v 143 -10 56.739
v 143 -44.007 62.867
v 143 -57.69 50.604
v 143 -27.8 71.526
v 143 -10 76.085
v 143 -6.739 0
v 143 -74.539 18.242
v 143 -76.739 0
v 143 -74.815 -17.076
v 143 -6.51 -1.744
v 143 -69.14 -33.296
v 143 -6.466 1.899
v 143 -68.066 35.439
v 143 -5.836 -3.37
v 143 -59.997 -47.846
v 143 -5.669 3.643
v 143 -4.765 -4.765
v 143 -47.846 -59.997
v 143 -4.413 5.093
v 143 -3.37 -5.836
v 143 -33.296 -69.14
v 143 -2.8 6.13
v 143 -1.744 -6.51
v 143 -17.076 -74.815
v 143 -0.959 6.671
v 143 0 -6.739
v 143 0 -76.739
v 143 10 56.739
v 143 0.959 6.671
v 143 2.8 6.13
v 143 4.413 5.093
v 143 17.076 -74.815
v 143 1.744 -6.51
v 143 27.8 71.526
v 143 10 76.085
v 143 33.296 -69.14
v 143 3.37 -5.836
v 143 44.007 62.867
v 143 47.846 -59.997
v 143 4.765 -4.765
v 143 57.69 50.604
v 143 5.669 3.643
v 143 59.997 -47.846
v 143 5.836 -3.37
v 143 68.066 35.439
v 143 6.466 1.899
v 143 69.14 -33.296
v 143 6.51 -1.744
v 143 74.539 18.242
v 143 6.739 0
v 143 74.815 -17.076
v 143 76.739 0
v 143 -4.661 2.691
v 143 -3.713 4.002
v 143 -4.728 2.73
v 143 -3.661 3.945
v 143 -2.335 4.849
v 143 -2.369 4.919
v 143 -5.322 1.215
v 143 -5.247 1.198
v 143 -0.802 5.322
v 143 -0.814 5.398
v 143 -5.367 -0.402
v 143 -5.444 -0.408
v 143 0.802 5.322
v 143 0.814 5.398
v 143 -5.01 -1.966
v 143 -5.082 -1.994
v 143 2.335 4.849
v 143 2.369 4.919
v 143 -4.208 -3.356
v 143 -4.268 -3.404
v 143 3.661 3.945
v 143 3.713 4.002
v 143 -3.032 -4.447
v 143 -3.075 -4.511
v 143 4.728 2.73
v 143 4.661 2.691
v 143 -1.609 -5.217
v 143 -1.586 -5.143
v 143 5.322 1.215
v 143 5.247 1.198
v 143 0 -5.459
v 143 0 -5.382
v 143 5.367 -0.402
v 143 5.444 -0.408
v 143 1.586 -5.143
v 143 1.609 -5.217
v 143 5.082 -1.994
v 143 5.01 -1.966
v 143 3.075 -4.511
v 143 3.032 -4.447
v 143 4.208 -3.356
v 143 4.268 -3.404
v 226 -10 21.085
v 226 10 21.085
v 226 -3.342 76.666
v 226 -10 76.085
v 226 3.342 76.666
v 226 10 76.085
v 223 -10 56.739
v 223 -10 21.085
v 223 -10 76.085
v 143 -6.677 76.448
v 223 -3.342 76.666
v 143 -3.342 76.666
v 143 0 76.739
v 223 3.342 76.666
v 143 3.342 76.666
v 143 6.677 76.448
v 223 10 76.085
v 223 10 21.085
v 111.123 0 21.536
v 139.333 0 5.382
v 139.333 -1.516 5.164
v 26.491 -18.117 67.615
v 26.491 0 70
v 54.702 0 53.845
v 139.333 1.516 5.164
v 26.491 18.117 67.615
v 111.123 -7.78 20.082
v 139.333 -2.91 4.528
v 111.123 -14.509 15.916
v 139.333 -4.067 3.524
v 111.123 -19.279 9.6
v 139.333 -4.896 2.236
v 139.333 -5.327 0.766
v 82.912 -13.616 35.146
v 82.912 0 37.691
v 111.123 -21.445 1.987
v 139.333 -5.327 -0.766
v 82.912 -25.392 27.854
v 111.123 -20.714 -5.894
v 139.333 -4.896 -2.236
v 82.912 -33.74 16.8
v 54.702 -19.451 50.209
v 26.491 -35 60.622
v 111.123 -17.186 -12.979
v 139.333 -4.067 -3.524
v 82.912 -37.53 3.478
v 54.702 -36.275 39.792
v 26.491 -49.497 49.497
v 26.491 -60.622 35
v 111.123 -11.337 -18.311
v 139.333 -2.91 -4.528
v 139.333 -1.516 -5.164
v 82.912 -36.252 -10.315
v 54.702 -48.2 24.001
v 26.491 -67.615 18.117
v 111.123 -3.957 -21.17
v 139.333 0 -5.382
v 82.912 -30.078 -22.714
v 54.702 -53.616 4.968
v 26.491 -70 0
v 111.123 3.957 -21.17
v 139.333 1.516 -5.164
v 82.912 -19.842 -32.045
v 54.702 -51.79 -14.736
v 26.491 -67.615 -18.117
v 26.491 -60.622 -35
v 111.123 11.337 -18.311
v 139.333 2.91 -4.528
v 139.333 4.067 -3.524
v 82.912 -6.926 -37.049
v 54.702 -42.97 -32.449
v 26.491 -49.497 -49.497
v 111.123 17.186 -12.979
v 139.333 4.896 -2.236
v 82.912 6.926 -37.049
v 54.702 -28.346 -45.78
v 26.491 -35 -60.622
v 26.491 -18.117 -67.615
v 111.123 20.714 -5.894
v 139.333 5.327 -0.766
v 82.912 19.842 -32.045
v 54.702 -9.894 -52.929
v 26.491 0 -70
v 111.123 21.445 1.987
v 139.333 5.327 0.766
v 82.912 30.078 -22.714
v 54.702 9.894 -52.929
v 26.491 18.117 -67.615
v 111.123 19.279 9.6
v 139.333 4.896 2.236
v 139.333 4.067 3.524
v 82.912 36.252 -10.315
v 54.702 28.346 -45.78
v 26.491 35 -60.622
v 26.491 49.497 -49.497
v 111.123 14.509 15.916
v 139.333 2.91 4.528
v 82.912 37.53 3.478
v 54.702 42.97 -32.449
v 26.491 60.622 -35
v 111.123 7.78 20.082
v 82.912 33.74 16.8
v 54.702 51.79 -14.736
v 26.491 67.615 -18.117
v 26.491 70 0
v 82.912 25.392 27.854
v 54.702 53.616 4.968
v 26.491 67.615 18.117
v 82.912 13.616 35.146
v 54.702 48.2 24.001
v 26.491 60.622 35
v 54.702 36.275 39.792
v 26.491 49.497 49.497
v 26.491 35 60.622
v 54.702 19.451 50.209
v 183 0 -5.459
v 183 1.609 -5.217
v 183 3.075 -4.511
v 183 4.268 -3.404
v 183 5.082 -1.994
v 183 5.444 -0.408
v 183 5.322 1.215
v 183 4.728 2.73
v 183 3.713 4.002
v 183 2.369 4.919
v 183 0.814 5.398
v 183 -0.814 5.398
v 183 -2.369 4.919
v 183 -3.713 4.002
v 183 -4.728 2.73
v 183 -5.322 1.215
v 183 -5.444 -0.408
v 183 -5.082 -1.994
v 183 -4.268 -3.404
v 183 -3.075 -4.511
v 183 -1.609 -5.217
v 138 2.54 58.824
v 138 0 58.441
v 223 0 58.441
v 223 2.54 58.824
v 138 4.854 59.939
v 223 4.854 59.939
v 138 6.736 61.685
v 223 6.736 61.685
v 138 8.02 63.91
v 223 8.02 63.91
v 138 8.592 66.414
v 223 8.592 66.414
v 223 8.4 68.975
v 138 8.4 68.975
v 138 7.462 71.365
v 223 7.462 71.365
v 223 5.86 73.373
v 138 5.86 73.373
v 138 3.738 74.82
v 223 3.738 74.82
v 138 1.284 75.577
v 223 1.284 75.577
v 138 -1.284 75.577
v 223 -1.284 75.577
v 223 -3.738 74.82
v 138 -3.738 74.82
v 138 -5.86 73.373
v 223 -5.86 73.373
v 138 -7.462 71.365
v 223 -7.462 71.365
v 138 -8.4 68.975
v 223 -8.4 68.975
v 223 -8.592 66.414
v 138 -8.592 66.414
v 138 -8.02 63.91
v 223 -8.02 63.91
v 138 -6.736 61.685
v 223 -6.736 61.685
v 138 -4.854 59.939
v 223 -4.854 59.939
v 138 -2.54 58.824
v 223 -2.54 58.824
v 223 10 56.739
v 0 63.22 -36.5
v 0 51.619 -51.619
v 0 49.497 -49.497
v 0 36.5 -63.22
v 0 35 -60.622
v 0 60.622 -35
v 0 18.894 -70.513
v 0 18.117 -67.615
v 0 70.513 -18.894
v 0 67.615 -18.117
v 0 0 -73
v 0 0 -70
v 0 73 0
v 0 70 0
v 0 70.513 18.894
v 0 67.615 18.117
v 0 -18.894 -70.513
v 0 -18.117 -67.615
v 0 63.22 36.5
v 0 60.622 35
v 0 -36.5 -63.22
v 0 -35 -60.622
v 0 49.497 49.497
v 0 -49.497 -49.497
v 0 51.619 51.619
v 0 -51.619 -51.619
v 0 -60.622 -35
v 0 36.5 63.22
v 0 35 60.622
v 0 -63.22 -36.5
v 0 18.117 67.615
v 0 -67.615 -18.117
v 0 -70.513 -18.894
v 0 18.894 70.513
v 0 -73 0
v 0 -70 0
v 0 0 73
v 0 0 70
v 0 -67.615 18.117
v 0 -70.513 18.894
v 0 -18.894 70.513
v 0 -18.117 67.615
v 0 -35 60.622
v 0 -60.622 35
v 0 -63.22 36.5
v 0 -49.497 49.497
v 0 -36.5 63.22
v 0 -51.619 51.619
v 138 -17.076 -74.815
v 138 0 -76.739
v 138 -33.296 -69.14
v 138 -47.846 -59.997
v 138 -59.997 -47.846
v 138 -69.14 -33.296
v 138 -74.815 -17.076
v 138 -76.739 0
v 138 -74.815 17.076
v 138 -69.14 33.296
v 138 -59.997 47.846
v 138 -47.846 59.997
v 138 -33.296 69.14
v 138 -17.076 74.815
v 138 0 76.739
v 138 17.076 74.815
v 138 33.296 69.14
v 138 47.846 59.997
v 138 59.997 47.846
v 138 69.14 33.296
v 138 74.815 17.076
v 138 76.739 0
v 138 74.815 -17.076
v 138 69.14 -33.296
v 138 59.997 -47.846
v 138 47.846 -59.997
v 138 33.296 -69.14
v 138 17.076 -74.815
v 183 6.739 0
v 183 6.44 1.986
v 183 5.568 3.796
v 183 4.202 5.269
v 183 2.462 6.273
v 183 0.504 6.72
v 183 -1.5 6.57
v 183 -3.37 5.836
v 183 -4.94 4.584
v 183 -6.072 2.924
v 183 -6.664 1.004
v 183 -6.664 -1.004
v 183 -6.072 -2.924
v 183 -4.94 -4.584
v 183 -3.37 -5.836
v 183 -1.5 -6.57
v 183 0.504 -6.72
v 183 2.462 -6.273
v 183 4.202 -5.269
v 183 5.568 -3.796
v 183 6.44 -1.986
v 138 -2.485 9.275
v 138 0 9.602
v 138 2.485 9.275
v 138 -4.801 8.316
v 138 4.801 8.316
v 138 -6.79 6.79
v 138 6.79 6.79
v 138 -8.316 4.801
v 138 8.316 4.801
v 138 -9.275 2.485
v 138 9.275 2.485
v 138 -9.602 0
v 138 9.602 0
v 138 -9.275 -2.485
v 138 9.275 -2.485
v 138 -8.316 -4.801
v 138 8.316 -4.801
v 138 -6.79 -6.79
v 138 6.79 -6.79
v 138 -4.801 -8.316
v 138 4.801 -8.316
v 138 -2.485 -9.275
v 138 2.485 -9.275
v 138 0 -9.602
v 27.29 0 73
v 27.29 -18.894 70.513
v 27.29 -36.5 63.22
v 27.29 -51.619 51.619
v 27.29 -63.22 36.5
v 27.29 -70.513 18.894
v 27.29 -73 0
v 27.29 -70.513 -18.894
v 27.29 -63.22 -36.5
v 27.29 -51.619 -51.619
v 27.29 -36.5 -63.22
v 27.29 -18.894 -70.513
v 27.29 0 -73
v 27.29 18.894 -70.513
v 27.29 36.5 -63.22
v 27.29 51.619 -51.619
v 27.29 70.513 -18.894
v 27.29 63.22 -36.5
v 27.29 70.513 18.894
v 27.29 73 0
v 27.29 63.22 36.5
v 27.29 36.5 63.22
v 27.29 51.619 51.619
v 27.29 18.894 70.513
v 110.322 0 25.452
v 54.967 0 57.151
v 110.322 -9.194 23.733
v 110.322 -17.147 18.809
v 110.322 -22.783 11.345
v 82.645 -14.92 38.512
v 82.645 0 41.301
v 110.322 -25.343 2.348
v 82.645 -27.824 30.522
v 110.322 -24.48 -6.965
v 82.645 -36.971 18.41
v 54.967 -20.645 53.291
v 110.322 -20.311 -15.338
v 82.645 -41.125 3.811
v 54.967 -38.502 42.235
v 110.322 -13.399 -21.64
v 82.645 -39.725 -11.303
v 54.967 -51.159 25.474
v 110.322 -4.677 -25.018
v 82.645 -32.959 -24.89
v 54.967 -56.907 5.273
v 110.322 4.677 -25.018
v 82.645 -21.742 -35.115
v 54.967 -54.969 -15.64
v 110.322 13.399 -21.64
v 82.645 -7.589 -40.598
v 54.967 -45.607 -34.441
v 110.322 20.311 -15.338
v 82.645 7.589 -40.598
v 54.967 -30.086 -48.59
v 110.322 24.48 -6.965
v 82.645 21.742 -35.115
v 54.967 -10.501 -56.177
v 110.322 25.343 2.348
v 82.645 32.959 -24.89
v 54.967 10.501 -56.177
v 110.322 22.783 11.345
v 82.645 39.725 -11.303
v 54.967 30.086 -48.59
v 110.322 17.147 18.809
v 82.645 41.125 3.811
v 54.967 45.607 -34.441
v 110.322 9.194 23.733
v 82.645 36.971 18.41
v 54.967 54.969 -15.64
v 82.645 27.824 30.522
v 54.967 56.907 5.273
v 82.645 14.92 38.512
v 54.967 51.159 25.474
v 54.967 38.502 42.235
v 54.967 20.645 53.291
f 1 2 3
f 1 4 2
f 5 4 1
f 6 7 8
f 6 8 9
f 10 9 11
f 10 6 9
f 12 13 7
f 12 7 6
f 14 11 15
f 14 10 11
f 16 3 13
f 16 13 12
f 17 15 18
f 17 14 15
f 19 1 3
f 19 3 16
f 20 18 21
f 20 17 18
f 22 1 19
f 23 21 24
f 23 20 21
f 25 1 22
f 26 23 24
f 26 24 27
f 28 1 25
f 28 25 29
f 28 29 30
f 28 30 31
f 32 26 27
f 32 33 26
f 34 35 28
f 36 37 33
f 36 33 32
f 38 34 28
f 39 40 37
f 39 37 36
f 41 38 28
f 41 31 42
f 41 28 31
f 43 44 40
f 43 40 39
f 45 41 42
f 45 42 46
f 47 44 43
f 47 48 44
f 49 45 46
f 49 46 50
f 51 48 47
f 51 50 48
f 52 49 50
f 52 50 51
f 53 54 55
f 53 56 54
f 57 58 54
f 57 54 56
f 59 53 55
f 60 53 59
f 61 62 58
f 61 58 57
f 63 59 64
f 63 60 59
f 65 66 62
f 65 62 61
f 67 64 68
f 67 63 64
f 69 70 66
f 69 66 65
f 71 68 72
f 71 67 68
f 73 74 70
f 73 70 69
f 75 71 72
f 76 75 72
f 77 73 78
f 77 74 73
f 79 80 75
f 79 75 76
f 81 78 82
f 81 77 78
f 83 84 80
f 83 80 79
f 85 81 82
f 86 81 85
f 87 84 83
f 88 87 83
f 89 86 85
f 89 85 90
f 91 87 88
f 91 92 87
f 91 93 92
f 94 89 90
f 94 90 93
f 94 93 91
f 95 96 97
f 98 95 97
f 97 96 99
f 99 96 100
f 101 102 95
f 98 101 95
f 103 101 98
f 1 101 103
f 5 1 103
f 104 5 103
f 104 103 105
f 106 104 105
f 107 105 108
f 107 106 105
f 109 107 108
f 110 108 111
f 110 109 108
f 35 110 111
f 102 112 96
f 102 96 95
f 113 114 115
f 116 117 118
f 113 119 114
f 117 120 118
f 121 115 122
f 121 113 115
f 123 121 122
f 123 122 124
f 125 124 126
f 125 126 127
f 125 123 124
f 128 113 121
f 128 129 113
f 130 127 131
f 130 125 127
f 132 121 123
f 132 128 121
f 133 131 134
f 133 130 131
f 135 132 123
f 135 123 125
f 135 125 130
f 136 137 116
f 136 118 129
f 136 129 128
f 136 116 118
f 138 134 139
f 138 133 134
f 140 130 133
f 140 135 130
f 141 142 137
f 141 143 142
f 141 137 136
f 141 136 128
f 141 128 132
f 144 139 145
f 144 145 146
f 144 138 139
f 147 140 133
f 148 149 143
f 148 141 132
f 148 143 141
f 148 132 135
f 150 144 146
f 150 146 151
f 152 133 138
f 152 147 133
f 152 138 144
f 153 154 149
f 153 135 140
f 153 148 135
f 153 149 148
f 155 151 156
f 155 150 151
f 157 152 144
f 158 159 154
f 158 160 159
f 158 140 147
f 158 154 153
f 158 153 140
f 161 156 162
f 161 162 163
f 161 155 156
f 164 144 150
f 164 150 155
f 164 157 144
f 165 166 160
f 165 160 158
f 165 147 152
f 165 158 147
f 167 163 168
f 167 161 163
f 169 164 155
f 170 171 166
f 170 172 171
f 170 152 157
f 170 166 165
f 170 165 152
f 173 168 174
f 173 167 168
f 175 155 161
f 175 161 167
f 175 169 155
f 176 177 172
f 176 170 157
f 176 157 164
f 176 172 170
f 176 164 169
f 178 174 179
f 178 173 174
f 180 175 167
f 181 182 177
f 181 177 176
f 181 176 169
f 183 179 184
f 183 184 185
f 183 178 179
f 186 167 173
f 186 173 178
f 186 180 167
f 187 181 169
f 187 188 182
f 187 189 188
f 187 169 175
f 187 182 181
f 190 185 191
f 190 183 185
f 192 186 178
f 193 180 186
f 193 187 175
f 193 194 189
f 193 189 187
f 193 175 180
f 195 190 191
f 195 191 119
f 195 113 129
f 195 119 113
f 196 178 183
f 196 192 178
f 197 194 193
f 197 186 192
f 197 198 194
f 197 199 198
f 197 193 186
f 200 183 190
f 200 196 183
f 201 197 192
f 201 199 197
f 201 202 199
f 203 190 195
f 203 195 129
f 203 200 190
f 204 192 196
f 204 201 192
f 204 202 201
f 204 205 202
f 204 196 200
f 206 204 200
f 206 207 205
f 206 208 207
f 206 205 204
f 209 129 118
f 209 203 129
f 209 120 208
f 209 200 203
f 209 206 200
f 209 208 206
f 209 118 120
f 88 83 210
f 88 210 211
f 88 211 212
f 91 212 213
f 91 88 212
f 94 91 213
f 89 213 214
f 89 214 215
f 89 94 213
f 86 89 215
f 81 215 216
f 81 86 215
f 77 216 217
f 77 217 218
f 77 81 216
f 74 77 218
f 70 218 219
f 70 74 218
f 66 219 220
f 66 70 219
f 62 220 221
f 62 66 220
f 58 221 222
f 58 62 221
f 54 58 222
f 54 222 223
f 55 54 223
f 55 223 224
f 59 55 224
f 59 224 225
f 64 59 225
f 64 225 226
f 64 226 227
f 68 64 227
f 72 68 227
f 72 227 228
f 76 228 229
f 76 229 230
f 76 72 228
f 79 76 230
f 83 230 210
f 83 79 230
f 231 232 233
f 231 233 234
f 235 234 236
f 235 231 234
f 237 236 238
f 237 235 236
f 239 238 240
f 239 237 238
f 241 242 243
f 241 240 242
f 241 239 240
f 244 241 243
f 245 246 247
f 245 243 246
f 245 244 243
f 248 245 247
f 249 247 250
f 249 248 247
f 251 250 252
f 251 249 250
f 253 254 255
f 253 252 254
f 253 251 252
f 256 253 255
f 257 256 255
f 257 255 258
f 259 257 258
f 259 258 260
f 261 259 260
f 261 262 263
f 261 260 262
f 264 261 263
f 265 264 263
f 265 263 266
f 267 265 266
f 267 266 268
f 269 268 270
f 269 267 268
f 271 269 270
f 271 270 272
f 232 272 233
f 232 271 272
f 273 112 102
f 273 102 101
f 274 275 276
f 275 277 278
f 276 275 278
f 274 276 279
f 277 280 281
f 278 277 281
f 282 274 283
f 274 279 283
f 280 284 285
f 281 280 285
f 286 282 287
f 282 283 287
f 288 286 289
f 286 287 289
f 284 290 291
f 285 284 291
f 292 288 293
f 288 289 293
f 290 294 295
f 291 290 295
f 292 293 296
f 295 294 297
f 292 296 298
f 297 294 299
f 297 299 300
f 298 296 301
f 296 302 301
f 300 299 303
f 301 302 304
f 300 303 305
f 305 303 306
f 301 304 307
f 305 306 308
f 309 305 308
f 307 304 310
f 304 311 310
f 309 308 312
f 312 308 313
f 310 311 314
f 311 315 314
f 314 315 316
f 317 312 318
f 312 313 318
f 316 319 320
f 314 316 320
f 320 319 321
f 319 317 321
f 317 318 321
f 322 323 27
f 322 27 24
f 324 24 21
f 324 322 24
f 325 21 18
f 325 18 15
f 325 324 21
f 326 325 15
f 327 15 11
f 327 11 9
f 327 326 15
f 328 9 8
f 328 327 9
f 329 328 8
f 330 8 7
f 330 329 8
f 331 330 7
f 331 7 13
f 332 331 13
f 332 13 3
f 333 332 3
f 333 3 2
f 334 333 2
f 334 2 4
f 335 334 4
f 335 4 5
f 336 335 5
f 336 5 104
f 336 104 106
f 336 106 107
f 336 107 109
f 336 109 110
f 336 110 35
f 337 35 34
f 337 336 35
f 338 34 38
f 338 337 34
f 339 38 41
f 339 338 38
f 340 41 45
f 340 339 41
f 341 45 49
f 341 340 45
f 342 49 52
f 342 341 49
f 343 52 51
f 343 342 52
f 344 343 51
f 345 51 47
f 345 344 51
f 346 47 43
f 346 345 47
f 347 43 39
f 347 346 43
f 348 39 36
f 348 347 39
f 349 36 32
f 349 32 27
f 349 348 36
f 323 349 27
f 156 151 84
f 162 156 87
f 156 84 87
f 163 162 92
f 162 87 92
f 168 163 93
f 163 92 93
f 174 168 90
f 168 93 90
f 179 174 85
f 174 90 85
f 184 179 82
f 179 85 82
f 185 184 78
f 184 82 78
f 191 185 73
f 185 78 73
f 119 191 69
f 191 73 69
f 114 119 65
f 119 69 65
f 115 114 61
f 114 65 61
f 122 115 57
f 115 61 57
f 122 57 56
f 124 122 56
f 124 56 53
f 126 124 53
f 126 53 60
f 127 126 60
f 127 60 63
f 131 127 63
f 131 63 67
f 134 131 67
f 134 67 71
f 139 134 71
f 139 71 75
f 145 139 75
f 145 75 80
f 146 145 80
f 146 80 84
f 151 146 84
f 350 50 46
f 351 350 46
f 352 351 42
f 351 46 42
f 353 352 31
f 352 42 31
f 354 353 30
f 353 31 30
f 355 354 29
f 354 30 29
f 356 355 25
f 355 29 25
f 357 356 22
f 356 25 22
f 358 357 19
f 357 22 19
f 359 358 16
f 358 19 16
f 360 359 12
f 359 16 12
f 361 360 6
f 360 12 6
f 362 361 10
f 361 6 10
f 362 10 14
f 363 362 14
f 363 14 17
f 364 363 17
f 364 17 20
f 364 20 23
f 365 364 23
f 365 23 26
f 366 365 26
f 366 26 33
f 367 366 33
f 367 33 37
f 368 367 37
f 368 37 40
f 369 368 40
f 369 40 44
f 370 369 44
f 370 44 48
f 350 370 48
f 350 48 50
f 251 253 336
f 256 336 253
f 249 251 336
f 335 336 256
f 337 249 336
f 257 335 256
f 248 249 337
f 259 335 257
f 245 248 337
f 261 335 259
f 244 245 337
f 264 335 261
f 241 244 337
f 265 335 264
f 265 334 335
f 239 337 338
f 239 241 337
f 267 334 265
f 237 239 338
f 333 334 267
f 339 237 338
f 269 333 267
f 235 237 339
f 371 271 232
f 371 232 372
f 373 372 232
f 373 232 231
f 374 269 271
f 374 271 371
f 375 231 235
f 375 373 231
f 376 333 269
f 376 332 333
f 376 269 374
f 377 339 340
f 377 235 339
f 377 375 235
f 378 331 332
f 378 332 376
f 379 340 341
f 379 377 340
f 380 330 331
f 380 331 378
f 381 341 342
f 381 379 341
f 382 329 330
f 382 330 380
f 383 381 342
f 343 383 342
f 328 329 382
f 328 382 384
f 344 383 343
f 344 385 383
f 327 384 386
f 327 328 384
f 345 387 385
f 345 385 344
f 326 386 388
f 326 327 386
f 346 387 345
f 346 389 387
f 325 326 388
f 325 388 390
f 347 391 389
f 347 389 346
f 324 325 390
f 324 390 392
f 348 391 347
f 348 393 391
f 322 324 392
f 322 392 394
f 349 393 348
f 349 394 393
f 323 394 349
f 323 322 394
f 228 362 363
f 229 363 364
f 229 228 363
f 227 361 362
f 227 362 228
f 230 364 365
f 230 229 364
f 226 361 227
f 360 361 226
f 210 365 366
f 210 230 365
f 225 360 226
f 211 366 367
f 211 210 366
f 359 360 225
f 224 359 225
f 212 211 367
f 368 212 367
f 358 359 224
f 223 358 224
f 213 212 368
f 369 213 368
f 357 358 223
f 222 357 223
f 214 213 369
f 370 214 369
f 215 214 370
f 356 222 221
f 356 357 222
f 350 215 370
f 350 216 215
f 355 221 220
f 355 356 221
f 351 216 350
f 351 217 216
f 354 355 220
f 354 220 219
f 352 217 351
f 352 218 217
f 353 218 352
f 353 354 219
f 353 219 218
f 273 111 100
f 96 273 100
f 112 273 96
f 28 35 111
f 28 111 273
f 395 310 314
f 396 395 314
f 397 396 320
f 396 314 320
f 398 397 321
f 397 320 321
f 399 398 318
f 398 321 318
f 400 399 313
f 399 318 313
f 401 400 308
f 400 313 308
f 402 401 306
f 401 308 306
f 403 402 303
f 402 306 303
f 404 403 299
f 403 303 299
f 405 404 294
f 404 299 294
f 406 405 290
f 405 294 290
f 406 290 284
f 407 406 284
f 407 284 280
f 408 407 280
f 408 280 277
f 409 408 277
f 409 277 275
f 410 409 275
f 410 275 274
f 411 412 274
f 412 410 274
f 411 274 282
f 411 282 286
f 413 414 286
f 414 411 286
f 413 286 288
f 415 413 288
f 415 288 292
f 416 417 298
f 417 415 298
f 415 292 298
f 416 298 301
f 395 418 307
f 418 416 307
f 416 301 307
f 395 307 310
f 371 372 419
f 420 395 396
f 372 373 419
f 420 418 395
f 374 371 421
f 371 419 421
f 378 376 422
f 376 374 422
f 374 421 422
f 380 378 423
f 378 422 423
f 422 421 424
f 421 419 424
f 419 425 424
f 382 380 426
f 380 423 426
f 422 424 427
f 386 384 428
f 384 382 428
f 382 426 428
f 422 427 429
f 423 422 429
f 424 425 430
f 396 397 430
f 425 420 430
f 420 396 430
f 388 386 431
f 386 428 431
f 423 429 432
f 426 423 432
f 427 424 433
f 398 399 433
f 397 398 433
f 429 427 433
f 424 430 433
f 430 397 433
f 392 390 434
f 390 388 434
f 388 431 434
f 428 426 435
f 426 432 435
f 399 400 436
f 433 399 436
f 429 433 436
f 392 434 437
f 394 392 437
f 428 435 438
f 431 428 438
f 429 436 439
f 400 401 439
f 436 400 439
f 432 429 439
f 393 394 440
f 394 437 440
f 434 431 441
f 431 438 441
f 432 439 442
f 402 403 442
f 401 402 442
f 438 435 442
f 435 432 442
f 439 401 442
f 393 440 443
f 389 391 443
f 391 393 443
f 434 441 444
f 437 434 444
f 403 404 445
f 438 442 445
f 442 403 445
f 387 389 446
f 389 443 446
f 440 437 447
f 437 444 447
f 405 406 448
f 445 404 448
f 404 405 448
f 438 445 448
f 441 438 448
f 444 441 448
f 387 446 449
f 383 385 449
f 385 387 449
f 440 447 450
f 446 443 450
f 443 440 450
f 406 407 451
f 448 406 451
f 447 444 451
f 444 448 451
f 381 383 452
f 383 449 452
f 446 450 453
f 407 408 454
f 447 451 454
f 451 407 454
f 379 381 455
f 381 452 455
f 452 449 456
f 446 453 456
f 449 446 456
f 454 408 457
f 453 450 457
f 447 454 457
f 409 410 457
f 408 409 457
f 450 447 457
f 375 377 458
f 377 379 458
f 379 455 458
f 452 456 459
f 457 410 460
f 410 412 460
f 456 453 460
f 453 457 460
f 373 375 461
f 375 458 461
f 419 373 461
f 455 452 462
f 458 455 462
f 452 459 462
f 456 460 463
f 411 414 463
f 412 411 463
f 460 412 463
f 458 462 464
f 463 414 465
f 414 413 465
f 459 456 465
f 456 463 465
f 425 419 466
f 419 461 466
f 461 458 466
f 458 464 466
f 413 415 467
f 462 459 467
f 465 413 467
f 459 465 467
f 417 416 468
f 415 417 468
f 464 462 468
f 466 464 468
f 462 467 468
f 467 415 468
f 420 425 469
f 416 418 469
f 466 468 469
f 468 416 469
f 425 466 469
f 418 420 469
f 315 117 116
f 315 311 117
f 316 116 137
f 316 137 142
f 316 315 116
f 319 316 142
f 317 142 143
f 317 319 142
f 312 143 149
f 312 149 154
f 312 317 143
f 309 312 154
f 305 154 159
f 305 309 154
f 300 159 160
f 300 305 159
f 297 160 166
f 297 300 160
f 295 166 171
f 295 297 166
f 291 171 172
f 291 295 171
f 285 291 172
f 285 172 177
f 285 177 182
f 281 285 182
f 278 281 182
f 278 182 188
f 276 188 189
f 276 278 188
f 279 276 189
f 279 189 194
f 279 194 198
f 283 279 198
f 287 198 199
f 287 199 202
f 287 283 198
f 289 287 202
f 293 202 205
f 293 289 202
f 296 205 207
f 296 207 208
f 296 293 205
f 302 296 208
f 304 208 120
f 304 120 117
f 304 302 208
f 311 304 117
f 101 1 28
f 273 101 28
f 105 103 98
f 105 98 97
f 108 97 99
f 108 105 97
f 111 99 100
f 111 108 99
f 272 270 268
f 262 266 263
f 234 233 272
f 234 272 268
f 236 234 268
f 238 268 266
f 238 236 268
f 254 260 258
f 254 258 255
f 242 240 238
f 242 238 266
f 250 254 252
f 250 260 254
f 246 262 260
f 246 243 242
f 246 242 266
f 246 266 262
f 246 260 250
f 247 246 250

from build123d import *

# Parameters (mm, degrees)
SHELL_1_T                = 3
SKETCH_4_R               = 5.381890803
CUT_EXTRUDE_2_DEPTH      = 10
SWEEP_START              = 143
SWEEP_2_OUTLINE_R        = 6.739132173
SWEEP_2_DEPTH            = 40
SKETCH_7_R               = 5.459251346
CUT_EXTRUDE_3_DEPTH      = 40
EXTRUDE_5_DEPTH          = 80
CUT_EXTRUDE_4_DEPTH      = 10
CUT_EXTRUDE_4_DEPTH_BACK = 90
SKETCH_12_R              = 8.615934325
EXTRUDE_6_DEPTH          = 3


# Read off the part's stored shape, not the designer's step: 扫描2
with BuildPart() as part:
    # 草图1 → 旋转1 (revolve)
    with BuildSketch(Plane(origin=(0, 0, 0), x_dir=(1, 0, 0), z_dir=(0, 1, 0)), mode=Mode.PRIVATE) as revolve_1_sk:
        Polygon((0, 0), (140, 0), (140, 5), (26.491388223, 70), (0, 70), align=None)
    revolve(revolve_1_sk.sketch.rotate(Axis((0, 0, 0), (1, 0, 0)), 180), axis=Axis((0, 0, 0), (1, 0, 0)))

    # 抽壳1
    shell_1_openings = [part.faces().sort_by_distance(p)[0] for p in [
        (0, 0, 0),
    ]]
    offset(amount=SHELL_1_T, openings=shell_1_openings, kind=Kind.INTERSECTION)

    # 草图4 → 切除-拉伸2 (cut)
    with BuildSketch(Plane(origin=(143, 0, 0), x_dir=(0, 0, -1), z_dir=(1, 0, 0))):
        Circle(SKETCH_4_R)
    extrude(amount=-CUT_EXTRUDE_2_DEPTH, mode=Mode.SUBTRACT)

    # 扫描2 outline → 扫描2 (add)
    with BuildSketch(Plane.YZ.offset(SWEEP_START)):
        Circle(SWEEP_2_OUTLINE_R)
    extrude(amount=SWEEP_2_DEPTH)

    # 草图7 → 切除-拉伸3 (cut)
    with BuildSketch(Plane(origin=(143, 0, 0), x_dir=(0, 0, -1), z_dir=(1, 0, 0))):
        Circle(SKETCH_7_R)
    extrude(amount=CUT_EXTRUDE_3_DEPTH, mode=Mode.SUBTRACT)

    # 扫描3: sweep along a curve in space
    with BuildLine() as sweep_3_path:
        ThreePointArc((143, 0, 6.739132173), (143, 4.765286059, 4.765286059), (143, 6.739132173, 0))
        ThreePointArc((143, 6.739132173, 0), (143, 4.765286059, -4.765286059), (143, 0, -6.739132173))
        ThreePointArc((143, 0, -6.739132173), (143, -4.765286059, -4.765286059), (143, -6.739132173, 0))
        ThreePointArc((143, -6.739132173, 0), (143, -4.765286059, 4.765286059), (143, 0, 6.739132173))
    # 草图9 → 扫描3 (sweep)
    with BuildSketch(Plane(origin=(0, 0, 0), x_dir=(1, 0, 0), z_dir=(0, 1, 0))):
        Polygon((143, 6.739132173), (143, 76.739132173), (138, 76.739132173), (138, 9.602351051), align=None)
    sweep(path=sweep_3_path.line)

    # 草图10 → 凸台-拉伸5 (add)
    with BuildSketch(Plane(origin=(143, 0, 0), x_dir=(0, 0, -1), z_dir=(1, 0, 0))):
        with BuildLine():
            Line((-56.739132173, 0), (-56.739132173, 10))
            Line((-56.739132173, 10), (-76.084784331, 10))
            ThreePointArc((-76.084784331, 10), (-76.739132173, 0), (-76.084784331, -10))
            Line((-76.084784331, -10), (-56.739132173, -10))
            Line((-56.739132173, -10), (-56.739132173, 0))
        make_face()
    extrude(amount=EXTRUDE_5_DEPTH)

    # 草图12 → 切除-拉伸4 (cut, two sides: drawn at the far end of the back side and taken through both)
    with BuildSketch(Plane(origin=(223, 0, 0), x_dir=(0, 0, -1), z_dir=(1, 0, 0)).offset(-CUT_EXTRUDE_4_DEPTH_BACK)):
        with Locations((-67.05739748, 0)):
            Circle(SKETCH_12_R)
    extrude(amount=CUT_EXTRUDE_4_DEPTH + CUT_EXTRUDE_4_DEPTH_BACK, mode=Mode.SUBTRACT)

    # 草图11 → 凸台-拉伸6 (add)
    with BuildSketch(Plane(origin=(223, 0, 0), x_dir=(0, 0, -1), z_dir=(1, 0, 0))):
        with BuildLine():
            Line((-76.084784331, 10), (-21.084784331, 10))
            Line((-21.084784331, 10), (-21.084784331, -10))
            Line((-21.084784331, -10), (-76.084784331, -10))
            ThreePointArc((-76.084784331, -10), (-76.739132173, 0), (-76.084784331, 10))
        make_face()
    extrude(amount=EXTRUDE_6_DEPTH)


solid = part.part
